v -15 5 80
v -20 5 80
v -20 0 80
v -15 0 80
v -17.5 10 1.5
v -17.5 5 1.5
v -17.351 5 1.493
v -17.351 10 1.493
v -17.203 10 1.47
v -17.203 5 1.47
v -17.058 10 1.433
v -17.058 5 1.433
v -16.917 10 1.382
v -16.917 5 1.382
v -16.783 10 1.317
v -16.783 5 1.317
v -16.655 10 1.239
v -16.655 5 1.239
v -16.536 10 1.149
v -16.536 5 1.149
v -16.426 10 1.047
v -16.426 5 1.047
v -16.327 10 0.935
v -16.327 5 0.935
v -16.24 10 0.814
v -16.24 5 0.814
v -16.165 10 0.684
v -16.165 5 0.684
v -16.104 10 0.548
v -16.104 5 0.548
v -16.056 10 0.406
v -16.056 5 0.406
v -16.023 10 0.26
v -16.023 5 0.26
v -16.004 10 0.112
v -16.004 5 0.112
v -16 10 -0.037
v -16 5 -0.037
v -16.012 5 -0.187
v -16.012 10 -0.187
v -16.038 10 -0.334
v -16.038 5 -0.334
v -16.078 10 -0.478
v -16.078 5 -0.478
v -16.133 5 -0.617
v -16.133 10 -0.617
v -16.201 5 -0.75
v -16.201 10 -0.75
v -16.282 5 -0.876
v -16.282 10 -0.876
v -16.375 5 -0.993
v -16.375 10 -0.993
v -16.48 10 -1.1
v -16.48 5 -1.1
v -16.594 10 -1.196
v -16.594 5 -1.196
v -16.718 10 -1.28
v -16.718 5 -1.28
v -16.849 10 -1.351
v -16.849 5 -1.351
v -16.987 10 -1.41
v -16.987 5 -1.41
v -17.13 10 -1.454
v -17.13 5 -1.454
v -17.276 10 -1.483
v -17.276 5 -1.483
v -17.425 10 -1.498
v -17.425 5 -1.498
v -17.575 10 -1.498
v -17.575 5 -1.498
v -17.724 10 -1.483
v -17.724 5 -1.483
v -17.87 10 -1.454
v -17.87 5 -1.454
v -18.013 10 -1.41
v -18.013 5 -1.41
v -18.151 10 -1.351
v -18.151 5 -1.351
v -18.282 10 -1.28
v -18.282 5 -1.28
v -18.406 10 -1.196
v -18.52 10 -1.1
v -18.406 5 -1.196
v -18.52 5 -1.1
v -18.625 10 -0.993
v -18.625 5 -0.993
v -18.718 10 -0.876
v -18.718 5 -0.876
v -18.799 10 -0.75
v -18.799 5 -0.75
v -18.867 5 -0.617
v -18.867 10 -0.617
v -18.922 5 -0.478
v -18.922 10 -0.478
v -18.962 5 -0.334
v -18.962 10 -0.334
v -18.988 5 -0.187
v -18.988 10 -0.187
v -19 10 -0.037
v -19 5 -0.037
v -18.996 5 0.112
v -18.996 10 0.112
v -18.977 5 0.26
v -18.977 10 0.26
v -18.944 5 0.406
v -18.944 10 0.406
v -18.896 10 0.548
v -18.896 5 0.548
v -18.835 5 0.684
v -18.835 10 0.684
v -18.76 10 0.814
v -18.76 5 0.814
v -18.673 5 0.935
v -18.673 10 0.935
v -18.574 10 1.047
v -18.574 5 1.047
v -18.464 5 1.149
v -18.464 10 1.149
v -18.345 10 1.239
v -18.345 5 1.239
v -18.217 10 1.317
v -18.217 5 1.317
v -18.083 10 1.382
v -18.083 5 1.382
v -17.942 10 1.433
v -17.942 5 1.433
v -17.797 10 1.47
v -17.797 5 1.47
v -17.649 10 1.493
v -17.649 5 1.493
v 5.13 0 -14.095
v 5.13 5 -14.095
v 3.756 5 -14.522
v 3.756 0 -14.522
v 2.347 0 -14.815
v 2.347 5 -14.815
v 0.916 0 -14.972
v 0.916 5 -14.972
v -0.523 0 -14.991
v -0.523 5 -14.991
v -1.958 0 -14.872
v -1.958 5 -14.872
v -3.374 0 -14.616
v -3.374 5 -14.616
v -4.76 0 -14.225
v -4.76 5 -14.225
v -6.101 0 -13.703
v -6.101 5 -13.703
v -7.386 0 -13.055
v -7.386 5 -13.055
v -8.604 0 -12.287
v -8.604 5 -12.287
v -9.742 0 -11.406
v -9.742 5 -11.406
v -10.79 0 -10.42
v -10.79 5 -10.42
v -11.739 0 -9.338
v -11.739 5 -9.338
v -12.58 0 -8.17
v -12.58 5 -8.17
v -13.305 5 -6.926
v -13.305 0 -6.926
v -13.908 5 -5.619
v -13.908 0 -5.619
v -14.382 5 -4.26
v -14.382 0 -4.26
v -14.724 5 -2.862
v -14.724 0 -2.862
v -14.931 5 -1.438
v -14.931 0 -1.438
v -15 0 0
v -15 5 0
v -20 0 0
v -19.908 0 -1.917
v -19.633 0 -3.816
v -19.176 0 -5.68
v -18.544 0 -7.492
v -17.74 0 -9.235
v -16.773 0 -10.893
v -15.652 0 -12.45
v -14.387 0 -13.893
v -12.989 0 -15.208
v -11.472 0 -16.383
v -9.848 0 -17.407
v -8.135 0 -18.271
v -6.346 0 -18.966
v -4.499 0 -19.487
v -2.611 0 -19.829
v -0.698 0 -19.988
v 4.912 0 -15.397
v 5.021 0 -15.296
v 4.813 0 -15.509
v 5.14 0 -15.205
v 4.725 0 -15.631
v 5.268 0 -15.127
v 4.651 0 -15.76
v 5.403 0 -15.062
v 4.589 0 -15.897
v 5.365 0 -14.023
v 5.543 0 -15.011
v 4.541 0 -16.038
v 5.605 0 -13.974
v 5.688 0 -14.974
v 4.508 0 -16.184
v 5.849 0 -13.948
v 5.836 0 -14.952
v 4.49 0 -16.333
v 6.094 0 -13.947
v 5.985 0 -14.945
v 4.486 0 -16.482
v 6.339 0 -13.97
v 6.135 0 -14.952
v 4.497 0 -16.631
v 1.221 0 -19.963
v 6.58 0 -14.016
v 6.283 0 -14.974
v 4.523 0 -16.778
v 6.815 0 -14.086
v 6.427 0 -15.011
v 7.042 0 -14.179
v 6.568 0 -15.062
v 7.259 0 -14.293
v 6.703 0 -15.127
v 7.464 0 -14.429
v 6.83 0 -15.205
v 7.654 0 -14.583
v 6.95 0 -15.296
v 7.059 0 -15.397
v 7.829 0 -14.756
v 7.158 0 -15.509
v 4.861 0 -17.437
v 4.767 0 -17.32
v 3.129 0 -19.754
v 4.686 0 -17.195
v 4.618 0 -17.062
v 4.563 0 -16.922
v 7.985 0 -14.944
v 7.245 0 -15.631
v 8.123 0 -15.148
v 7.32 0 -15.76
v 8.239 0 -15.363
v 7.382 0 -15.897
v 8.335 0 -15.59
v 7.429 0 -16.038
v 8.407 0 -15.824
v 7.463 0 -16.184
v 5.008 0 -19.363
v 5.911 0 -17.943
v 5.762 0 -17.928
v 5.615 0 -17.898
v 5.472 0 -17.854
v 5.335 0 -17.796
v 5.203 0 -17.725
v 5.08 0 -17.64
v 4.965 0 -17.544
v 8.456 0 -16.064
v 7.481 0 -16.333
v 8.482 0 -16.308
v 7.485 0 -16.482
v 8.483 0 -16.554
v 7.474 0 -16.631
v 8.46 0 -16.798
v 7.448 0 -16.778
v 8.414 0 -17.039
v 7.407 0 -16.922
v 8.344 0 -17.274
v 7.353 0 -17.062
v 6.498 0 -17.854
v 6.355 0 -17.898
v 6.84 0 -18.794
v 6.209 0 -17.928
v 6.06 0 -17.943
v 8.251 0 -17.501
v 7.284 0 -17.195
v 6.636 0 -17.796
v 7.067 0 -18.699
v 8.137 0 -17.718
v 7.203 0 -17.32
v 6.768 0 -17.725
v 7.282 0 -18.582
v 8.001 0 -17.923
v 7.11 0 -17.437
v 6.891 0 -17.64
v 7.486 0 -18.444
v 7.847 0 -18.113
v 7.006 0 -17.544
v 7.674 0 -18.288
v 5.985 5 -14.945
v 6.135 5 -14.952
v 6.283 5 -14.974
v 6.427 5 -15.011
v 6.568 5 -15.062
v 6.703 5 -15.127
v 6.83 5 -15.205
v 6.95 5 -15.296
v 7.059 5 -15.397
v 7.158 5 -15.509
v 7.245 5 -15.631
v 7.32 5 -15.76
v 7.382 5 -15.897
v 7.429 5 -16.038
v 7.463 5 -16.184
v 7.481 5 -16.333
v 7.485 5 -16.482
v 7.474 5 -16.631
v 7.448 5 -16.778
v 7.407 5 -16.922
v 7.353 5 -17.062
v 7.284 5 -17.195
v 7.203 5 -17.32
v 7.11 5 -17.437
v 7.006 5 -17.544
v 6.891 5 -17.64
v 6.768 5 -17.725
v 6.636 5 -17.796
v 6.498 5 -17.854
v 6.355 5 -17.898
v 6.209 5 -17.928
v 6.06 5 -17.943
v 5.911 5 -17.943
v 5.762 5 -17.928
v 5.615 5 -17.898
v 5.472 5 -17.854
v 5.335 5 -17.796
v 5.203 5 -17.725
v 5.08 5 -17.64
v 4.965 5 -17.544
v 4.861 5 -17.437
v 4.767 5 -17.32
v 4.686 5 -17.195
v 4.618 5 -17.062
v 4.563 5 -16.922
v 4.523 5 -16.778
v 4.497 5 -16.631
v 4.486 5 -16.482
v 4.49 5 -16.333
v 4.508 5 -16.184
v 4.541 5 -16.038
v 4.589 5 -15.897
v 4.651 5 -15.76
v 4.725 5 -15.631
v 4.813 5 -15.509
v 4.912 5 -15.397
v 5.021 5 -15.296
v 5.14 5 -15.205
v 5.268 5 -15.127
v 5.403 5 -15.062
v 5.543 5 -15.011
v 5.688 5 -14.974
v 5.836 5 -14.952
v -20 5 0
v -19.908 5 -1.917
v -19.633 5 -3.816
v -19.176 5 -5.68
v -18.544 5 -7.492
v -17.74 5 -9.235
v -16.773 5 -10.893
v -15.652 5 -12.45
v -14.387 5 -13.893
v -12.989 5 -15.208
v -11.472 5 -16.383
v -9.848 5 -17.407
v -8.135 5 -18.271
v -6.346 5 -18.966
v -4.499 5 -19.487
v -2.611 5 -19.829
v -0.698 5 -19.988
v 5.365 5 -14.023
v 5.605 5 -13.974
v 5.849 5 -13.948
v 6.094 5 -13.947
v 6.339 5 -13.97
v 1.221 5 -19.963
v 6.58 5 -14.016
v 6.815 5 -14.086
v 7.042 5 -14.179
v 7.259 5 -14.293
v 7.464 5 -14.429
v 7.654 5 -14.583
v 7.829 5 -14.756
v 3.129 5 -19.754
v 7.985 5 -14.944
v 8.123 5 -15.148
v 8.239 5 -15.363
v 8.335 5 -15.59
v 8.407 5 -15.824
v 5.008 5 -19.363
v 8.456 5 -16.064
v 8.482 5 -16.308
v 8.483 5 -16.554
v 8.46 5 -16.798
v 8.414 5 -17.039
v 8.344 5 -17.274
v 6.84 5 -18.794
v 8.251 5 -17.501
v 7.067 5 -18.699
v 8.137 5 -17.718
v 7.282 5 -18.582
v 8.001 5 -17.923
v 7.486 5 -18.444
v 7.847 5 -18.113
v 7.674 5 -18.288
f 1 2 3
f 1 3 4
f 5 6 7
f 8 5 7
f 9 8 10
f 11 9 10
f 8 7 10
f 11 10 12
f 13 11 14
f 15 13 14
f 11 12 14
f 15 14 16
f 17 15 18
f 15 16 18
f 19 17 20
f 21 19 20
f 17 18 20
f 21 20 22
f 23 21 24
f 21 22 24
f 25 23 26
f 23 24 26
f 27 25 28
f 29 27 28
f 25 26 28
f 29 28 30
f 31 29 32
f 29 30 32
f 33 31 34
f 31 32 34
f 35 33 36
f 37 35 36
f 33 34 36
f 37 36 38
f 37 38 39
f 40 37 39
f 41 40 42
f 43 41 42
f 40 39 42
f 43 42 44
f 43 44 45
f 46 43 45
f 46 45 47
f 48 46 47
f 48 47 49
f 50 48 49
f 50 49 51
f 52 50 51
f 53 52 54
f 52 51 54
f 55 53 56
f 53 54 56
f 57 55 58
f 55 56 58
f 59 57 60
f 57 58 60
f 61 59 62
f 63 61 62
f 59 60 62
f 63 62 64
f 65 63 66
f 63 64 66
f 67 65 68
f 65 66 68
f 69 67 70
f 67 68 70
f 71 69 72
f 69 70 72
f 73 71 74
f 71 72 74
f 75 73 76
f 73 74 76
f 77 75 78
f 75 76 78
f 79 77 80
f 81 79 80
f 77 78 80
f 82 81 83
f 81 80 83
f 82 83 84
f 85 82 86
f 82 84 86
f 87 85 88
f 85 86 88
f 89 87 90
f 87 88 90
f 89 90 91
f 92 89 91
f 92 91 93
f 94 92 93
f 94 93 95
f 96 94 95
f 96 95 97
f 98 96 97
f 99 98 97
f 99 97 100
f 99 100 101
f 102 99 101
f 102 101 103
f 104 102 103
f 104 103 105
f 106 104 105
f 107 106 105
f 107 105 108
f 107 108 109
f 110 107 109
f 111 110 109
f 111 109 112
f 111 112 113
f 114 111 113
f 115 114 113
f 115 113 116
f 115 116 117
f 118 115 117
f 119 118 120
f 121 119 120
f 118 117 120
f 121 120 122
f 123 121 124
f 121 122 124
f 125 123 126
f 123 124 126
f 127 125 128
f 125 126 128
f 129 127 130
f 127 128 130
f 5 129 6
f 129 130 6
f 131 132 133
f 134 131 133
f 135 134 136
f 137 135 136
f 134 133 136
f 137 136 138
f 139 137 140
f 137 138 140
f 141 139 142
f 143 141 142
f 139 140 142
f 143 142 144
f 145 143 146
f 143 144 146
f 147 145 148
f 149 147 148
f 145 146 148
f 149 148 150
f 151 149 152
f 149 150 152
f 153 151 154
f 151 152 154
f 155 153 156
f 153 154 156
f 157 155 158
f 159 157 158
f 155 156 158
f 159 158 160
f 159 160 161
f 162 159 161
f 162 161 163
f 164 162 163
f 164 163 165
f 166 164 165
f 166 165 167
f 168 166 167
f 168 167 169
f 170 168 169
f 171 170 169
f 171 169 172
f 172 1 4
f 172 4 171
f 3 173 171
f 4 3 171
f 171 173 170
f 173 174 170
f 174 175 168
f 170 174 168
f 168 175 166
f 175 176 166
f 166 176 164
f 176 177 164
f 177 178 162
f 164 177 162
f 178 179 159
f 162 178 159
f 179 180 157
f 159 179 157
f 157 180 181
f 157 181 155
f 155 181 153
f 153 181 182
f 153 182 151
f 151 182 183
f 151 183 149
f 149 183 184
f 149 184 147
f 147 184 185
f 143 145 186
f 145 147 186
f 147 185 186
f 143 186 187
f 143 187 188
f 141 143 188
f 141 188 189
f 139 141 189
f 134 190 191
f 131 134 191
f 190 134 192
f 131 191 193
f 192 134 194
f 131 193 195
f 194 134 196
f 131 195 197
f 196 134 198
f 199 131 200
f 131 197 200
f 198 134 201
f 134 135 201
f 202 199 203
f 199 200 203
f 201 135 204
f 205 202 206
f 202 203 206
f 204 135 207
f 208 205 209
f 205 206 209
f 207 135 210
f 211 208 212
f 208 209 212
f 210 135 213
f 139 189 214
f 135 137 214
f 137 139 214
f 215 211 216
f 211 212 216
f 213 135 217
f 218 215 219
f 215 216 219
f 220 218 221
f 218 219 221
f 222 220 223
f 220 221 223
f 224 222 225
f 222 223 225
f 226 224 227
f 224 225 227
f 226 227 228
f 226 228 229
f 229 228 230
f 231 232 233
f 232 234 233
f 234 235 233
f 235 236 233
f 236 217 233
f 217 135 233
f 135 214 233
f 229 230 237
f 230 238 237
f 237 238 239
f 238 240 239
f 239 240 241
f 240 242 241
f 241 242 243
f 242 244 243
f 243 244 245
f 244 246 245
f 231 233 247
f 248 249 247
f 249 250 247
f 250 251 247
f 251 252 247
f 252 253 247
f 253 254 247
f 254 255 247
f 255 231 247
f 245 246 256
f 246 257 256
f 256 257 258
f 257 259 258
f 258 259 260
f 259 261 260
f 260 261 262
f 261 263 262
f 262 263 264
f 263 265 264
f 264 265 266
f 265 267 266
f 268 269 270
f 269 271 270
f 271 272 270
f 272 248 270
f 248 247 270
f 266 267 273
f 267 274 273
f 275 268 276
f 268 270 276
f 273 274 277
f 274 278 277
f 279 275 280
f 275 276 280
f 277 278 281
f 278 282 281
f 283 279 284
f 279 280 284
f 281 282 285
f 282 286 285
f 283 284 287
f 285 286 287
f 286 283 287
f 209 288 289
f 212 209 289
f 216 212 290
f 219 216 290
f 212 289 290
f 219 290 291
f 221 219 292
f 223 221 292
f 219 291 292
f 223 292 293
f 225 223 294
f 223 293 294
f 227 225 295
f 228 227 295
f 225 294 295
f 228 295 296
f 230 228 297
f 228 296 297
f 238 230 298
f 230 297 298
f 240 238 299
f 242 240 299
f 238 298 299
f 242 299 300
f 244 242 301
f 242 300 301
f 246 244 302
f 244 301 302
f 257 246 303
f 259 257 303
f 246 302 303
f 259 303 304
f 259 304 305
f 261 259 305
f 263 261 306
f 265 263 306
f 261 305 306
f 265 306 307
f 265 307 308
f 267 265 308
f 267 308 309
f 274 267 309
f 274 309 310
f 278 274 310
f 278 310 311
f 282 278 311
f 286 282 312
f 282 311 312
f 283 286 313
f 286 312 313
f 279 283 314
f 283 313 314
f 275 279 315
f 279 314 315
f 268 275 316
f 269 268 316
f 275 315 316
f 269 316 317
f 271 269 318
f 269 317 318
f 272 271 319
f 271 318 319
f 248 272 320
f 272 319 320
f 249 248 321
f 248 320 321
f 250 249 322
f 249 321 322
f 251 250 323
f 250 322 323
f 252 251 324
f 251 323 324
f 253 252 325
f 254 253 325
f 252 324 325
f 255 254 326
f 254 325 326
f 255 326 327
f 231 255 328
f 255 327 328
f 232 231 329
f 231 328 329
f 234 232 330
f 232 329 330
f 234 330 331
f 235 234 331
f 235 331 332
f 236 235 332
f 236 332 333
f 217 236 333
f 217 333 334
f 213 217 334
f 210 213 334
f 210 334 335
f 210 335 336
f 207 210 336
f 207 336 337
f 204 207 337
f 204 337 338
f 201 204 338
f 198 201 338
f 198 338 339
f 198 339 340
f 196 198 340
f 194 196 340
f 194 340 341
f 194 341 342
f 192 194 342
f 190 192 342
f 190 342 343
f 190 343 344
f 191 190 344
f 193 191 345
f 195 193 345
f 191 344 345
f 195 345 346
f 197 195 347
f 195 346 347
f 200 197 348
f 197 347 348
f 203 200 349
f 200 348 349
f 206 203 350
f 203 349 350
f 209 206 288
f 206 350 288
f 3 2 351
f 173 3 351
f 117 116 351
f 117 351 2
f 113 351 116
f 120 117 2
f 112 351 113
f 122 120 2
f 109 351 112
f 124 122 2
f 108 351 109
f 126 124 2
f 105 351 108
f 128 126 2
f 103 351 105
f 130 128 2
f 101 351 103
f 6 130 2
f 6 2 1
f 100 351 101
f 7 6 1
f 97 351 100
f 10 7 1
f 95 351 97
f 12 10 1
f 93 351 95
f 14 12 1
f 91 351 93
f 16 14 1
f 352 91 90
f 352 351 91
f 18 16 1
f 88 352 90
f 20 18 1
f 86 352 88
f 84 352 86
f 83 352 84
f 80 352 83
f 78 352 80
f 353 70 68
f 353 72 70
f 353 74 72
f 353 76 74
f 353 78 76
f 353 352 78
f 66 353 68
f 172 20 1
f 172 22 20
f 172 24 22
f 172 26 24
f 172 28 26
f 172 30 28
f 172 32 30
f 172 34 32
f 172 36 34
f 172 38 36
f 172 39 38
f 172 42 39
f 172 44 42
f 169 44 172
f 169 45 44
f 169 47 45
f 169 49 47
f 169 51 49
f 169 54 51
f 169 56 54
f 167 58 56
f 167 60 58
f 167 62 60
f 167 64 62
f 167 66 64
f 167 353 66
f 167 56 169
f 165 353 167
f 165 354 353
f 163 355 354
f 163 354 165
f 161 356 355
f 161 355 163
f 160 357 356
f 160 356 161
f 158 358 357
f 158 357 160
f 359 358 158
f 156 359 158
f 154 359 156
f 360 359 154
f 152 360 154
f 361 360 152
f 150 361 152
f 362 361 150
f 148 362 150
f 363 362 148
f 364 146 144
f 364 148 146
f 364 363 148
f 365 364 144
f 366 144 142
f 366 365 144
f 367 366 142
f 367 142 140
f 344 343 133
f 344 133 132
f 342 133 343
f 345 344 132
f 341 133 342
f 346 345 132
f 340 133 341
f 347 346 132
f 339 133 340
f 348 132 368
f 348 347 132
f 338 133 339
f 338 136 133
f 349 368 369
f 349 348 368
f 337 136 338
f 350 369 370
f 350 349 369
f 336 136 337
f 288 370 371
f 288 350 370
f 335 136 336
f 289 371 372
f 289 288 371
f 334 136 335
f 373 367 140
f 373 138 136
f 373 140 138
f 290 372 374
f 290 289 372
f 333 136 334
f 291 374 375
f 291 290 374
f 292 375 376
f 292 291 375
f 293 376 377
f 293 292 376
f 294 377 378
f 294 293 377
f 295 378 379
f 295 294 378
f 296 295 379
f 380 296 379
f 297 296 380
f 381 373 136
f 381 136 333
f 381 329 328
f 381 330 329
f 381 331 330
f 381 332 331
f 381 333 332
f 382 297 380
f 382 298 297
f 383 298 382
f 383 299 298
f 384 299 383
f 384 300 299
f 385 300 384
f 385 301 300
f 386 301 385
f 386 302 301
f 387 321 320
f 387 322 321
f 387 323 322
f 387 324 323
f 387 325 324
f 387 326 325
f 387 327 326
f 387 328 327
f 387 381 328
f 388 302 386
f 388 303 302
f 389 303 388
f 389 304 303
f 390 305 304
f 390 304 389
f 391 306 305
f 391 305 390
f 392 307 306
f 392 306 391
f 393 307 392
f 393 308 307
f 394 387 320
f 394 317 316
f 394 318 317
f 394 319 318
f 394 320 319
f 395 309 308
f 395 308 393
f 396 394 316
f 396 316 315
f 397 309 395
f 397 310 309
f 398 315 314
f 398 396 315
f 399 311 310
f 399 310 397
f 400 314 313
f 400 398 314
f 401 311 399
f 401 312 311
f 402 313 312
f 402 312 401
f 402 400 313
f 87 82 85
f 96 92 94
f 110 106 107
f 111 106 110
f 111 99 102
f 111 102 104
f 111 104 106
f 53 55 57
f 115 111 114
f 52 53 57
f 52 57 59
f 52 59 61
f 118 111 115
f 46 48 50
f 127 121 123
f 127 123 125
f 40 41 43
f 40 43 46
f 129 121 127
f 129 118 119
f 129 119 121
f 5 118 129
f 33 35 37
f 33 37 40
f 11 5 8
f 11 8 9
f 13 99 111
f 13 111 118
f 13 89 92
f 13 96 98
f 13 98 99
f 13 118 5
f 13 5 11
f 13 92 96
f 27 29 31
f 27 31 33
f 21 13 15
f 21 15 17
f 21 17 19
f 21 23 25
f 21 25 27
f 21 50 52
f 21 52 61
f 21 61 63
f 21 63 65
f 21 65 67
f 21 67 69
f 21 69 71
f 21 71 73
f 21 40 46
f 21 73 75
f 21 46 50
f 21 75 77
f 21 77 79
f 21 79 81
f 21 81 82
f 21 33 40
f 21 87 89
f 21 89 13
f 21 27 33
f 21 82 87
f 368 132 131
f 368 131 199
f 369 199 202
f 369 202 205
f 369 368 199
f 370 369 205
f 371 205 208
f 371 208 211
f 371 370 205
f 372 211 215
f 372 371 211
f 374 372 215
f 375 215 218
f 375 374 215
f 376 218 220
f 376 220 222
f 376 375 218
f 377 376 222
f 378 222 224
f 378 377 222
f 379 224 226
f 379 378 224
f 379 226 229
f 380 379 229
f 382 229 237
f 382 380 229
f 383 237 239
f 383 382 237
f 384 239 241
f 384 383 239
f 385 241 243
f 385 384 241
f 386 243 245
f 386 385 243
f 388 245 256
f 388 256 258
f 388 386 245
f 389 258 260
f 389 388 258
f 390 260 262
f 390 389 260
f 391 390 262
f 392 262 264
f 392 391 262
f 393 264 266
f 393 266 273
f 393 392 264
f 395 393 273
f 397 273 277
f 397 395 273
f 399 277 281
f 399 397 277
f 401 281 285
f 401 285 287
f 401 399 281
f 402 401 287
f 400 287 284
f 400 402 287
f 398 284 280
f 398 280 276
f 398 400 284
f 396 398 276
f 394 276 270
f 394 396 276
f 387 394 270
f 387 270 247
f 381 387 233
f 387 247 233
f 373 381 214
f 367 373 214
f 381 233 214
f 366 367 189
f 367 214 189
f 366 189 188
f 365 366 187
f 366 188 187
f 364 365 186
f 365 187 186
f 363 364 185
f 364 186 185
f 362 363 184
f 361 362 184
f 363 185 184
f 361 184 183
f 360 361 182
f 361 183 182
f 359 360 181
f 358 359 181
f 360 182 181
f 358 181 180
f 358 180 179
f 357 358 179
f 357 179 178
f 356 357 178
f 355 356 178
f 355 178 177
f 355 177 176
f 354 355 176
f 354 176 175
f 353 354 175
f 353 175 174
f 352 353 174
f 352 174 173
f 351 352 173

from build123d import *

# Parameters (mm, degrees)
SKETCH1_R           = 20
BOSS_EXTRUDE1_DEPTH = 5
SKETCH2_R           = 15
CUT_EXTRUDE1_DEPTH  = 5
CUT_EXTRUDE3_START  = -5
CUT_EXTRUDE3_DEPTH  = 5
SKETCH7_W           = 5
SKETCH7_H           = 80
BOSS_EXTRUDE2_DEPTH = 5
BOSS_EXTRUDE3_DEPTH = 5
SKETCH10_R          = 1.5
CUT_EXTRUDE4_DEPTH  = 5
SKETCH11_R          = 1.5
BOSS_EXTRUDE4_DEPTH = 5


with BuildPart() as part:
    # Sketch1 → Boss-Extrude1 (new body)
    with BuildSketch(Plane(origin=(0, 0, 0), x_dir=(1, 0, 0), z_dir=(0, 1, 0))):
        with Locations(Location((0, 0, 0), (0, 0, 270))):
            Circle(SKETCH1_R)
    extrude(amount=BOSS_EXTRUDE1_DEPTH)

    # Sketch2 → Cut-Extrude1 (cut)
    with BuildSketch(Plane(origin=(0, 5, 0), x_dir=(1, 0, 0), z_dir=(0, 1, 0))):
        with Locations(Location((0, 0, 0), (0, 0, 270))):
            Circle(SKETCH2_R)
    extrude(amount=-CUT_EXTRUDE1_DEPTH, mode=Mode.SUBTRACT)

    # Sketch3 → Cut-Extrude3 (cut)
    with BuildSketch(Plane(origin=(0, 5, 0), x_dir=(1, 0, 0), z_dir=(0, 1, 0)).offset(CUT_EXTRUDE3_START)):
        with BuildLine():
            Line((6.840402867, 18.793852416), (0, 0))
            Line((0, 0), (-20, 0))
            ThreePointArc((-20, 0), (11.471528727, -16.383040886), (6.840402867, 18.793852416))
        make_face()
    extrude(amount=CUT_EXTRUDE3_DEPTH, mode=Mode.SUBTRACT)

    # Sketch7 → Boss-Extrude2 (add)
    with BuildSketch(Plane(origin=(0, 5, 0), x_dir=(1, 0, 0), z_dir=(0, 1, 0))):
        with Locations((-17.5, -40)):
            Rectangle(SKETCH7_W, SKETCH7_H)
    extrude(amount=-BOSS_EXTRUDE2_DEPTH)

    # Sketch9 → Boss-Extrude3 (add)
    with BuildSketch(Plane(origin=(0, 5, 0), x_dir=(1, 0, 0), z_dir=(0, 1, 0))):
        with BuildLine():
            Line((6.840402867, 18.793852416), (5.13030215, 14.095389312))
            ThreePointArc((5.13030215, 14.095389312), (8.33458406, 15.589570505), (6.840402867, 18.793852416))
        make_face()
    extrude(amount=-BOSS_EXTRUDE3_DEPTH)

    # Sketch10 → Cut-Extrude4 (cut)
    with BuildSketch(Plane(origin=(0, 5, 0), x_dir=(1, 0, 0), z_dir=(0, 1, 0))):
        with Locations(Location((5.985352508, 16.444620864, 0), (0, 0, 270))):
            Circle(SKETCH10_R)
    extrude(amount=-CUT_EXTRUDE4_DEPTH, mode=Mode.SUBTRACT)

    # Sketch11 → Boss-Extrude4 (add)
    with BuildSketch(Plane(origin=(0, 5, 0), x_dir=(1, 0, 0), z_dir=(0, 1, 0))):
        with Locations(Location((-17.5, 0, 0), (0, 0, 270))):
            Circle(SKETCH11_R)
    extrude(amount=BOSS_EXTRUDE4_DEPTH)


solid = part.part
